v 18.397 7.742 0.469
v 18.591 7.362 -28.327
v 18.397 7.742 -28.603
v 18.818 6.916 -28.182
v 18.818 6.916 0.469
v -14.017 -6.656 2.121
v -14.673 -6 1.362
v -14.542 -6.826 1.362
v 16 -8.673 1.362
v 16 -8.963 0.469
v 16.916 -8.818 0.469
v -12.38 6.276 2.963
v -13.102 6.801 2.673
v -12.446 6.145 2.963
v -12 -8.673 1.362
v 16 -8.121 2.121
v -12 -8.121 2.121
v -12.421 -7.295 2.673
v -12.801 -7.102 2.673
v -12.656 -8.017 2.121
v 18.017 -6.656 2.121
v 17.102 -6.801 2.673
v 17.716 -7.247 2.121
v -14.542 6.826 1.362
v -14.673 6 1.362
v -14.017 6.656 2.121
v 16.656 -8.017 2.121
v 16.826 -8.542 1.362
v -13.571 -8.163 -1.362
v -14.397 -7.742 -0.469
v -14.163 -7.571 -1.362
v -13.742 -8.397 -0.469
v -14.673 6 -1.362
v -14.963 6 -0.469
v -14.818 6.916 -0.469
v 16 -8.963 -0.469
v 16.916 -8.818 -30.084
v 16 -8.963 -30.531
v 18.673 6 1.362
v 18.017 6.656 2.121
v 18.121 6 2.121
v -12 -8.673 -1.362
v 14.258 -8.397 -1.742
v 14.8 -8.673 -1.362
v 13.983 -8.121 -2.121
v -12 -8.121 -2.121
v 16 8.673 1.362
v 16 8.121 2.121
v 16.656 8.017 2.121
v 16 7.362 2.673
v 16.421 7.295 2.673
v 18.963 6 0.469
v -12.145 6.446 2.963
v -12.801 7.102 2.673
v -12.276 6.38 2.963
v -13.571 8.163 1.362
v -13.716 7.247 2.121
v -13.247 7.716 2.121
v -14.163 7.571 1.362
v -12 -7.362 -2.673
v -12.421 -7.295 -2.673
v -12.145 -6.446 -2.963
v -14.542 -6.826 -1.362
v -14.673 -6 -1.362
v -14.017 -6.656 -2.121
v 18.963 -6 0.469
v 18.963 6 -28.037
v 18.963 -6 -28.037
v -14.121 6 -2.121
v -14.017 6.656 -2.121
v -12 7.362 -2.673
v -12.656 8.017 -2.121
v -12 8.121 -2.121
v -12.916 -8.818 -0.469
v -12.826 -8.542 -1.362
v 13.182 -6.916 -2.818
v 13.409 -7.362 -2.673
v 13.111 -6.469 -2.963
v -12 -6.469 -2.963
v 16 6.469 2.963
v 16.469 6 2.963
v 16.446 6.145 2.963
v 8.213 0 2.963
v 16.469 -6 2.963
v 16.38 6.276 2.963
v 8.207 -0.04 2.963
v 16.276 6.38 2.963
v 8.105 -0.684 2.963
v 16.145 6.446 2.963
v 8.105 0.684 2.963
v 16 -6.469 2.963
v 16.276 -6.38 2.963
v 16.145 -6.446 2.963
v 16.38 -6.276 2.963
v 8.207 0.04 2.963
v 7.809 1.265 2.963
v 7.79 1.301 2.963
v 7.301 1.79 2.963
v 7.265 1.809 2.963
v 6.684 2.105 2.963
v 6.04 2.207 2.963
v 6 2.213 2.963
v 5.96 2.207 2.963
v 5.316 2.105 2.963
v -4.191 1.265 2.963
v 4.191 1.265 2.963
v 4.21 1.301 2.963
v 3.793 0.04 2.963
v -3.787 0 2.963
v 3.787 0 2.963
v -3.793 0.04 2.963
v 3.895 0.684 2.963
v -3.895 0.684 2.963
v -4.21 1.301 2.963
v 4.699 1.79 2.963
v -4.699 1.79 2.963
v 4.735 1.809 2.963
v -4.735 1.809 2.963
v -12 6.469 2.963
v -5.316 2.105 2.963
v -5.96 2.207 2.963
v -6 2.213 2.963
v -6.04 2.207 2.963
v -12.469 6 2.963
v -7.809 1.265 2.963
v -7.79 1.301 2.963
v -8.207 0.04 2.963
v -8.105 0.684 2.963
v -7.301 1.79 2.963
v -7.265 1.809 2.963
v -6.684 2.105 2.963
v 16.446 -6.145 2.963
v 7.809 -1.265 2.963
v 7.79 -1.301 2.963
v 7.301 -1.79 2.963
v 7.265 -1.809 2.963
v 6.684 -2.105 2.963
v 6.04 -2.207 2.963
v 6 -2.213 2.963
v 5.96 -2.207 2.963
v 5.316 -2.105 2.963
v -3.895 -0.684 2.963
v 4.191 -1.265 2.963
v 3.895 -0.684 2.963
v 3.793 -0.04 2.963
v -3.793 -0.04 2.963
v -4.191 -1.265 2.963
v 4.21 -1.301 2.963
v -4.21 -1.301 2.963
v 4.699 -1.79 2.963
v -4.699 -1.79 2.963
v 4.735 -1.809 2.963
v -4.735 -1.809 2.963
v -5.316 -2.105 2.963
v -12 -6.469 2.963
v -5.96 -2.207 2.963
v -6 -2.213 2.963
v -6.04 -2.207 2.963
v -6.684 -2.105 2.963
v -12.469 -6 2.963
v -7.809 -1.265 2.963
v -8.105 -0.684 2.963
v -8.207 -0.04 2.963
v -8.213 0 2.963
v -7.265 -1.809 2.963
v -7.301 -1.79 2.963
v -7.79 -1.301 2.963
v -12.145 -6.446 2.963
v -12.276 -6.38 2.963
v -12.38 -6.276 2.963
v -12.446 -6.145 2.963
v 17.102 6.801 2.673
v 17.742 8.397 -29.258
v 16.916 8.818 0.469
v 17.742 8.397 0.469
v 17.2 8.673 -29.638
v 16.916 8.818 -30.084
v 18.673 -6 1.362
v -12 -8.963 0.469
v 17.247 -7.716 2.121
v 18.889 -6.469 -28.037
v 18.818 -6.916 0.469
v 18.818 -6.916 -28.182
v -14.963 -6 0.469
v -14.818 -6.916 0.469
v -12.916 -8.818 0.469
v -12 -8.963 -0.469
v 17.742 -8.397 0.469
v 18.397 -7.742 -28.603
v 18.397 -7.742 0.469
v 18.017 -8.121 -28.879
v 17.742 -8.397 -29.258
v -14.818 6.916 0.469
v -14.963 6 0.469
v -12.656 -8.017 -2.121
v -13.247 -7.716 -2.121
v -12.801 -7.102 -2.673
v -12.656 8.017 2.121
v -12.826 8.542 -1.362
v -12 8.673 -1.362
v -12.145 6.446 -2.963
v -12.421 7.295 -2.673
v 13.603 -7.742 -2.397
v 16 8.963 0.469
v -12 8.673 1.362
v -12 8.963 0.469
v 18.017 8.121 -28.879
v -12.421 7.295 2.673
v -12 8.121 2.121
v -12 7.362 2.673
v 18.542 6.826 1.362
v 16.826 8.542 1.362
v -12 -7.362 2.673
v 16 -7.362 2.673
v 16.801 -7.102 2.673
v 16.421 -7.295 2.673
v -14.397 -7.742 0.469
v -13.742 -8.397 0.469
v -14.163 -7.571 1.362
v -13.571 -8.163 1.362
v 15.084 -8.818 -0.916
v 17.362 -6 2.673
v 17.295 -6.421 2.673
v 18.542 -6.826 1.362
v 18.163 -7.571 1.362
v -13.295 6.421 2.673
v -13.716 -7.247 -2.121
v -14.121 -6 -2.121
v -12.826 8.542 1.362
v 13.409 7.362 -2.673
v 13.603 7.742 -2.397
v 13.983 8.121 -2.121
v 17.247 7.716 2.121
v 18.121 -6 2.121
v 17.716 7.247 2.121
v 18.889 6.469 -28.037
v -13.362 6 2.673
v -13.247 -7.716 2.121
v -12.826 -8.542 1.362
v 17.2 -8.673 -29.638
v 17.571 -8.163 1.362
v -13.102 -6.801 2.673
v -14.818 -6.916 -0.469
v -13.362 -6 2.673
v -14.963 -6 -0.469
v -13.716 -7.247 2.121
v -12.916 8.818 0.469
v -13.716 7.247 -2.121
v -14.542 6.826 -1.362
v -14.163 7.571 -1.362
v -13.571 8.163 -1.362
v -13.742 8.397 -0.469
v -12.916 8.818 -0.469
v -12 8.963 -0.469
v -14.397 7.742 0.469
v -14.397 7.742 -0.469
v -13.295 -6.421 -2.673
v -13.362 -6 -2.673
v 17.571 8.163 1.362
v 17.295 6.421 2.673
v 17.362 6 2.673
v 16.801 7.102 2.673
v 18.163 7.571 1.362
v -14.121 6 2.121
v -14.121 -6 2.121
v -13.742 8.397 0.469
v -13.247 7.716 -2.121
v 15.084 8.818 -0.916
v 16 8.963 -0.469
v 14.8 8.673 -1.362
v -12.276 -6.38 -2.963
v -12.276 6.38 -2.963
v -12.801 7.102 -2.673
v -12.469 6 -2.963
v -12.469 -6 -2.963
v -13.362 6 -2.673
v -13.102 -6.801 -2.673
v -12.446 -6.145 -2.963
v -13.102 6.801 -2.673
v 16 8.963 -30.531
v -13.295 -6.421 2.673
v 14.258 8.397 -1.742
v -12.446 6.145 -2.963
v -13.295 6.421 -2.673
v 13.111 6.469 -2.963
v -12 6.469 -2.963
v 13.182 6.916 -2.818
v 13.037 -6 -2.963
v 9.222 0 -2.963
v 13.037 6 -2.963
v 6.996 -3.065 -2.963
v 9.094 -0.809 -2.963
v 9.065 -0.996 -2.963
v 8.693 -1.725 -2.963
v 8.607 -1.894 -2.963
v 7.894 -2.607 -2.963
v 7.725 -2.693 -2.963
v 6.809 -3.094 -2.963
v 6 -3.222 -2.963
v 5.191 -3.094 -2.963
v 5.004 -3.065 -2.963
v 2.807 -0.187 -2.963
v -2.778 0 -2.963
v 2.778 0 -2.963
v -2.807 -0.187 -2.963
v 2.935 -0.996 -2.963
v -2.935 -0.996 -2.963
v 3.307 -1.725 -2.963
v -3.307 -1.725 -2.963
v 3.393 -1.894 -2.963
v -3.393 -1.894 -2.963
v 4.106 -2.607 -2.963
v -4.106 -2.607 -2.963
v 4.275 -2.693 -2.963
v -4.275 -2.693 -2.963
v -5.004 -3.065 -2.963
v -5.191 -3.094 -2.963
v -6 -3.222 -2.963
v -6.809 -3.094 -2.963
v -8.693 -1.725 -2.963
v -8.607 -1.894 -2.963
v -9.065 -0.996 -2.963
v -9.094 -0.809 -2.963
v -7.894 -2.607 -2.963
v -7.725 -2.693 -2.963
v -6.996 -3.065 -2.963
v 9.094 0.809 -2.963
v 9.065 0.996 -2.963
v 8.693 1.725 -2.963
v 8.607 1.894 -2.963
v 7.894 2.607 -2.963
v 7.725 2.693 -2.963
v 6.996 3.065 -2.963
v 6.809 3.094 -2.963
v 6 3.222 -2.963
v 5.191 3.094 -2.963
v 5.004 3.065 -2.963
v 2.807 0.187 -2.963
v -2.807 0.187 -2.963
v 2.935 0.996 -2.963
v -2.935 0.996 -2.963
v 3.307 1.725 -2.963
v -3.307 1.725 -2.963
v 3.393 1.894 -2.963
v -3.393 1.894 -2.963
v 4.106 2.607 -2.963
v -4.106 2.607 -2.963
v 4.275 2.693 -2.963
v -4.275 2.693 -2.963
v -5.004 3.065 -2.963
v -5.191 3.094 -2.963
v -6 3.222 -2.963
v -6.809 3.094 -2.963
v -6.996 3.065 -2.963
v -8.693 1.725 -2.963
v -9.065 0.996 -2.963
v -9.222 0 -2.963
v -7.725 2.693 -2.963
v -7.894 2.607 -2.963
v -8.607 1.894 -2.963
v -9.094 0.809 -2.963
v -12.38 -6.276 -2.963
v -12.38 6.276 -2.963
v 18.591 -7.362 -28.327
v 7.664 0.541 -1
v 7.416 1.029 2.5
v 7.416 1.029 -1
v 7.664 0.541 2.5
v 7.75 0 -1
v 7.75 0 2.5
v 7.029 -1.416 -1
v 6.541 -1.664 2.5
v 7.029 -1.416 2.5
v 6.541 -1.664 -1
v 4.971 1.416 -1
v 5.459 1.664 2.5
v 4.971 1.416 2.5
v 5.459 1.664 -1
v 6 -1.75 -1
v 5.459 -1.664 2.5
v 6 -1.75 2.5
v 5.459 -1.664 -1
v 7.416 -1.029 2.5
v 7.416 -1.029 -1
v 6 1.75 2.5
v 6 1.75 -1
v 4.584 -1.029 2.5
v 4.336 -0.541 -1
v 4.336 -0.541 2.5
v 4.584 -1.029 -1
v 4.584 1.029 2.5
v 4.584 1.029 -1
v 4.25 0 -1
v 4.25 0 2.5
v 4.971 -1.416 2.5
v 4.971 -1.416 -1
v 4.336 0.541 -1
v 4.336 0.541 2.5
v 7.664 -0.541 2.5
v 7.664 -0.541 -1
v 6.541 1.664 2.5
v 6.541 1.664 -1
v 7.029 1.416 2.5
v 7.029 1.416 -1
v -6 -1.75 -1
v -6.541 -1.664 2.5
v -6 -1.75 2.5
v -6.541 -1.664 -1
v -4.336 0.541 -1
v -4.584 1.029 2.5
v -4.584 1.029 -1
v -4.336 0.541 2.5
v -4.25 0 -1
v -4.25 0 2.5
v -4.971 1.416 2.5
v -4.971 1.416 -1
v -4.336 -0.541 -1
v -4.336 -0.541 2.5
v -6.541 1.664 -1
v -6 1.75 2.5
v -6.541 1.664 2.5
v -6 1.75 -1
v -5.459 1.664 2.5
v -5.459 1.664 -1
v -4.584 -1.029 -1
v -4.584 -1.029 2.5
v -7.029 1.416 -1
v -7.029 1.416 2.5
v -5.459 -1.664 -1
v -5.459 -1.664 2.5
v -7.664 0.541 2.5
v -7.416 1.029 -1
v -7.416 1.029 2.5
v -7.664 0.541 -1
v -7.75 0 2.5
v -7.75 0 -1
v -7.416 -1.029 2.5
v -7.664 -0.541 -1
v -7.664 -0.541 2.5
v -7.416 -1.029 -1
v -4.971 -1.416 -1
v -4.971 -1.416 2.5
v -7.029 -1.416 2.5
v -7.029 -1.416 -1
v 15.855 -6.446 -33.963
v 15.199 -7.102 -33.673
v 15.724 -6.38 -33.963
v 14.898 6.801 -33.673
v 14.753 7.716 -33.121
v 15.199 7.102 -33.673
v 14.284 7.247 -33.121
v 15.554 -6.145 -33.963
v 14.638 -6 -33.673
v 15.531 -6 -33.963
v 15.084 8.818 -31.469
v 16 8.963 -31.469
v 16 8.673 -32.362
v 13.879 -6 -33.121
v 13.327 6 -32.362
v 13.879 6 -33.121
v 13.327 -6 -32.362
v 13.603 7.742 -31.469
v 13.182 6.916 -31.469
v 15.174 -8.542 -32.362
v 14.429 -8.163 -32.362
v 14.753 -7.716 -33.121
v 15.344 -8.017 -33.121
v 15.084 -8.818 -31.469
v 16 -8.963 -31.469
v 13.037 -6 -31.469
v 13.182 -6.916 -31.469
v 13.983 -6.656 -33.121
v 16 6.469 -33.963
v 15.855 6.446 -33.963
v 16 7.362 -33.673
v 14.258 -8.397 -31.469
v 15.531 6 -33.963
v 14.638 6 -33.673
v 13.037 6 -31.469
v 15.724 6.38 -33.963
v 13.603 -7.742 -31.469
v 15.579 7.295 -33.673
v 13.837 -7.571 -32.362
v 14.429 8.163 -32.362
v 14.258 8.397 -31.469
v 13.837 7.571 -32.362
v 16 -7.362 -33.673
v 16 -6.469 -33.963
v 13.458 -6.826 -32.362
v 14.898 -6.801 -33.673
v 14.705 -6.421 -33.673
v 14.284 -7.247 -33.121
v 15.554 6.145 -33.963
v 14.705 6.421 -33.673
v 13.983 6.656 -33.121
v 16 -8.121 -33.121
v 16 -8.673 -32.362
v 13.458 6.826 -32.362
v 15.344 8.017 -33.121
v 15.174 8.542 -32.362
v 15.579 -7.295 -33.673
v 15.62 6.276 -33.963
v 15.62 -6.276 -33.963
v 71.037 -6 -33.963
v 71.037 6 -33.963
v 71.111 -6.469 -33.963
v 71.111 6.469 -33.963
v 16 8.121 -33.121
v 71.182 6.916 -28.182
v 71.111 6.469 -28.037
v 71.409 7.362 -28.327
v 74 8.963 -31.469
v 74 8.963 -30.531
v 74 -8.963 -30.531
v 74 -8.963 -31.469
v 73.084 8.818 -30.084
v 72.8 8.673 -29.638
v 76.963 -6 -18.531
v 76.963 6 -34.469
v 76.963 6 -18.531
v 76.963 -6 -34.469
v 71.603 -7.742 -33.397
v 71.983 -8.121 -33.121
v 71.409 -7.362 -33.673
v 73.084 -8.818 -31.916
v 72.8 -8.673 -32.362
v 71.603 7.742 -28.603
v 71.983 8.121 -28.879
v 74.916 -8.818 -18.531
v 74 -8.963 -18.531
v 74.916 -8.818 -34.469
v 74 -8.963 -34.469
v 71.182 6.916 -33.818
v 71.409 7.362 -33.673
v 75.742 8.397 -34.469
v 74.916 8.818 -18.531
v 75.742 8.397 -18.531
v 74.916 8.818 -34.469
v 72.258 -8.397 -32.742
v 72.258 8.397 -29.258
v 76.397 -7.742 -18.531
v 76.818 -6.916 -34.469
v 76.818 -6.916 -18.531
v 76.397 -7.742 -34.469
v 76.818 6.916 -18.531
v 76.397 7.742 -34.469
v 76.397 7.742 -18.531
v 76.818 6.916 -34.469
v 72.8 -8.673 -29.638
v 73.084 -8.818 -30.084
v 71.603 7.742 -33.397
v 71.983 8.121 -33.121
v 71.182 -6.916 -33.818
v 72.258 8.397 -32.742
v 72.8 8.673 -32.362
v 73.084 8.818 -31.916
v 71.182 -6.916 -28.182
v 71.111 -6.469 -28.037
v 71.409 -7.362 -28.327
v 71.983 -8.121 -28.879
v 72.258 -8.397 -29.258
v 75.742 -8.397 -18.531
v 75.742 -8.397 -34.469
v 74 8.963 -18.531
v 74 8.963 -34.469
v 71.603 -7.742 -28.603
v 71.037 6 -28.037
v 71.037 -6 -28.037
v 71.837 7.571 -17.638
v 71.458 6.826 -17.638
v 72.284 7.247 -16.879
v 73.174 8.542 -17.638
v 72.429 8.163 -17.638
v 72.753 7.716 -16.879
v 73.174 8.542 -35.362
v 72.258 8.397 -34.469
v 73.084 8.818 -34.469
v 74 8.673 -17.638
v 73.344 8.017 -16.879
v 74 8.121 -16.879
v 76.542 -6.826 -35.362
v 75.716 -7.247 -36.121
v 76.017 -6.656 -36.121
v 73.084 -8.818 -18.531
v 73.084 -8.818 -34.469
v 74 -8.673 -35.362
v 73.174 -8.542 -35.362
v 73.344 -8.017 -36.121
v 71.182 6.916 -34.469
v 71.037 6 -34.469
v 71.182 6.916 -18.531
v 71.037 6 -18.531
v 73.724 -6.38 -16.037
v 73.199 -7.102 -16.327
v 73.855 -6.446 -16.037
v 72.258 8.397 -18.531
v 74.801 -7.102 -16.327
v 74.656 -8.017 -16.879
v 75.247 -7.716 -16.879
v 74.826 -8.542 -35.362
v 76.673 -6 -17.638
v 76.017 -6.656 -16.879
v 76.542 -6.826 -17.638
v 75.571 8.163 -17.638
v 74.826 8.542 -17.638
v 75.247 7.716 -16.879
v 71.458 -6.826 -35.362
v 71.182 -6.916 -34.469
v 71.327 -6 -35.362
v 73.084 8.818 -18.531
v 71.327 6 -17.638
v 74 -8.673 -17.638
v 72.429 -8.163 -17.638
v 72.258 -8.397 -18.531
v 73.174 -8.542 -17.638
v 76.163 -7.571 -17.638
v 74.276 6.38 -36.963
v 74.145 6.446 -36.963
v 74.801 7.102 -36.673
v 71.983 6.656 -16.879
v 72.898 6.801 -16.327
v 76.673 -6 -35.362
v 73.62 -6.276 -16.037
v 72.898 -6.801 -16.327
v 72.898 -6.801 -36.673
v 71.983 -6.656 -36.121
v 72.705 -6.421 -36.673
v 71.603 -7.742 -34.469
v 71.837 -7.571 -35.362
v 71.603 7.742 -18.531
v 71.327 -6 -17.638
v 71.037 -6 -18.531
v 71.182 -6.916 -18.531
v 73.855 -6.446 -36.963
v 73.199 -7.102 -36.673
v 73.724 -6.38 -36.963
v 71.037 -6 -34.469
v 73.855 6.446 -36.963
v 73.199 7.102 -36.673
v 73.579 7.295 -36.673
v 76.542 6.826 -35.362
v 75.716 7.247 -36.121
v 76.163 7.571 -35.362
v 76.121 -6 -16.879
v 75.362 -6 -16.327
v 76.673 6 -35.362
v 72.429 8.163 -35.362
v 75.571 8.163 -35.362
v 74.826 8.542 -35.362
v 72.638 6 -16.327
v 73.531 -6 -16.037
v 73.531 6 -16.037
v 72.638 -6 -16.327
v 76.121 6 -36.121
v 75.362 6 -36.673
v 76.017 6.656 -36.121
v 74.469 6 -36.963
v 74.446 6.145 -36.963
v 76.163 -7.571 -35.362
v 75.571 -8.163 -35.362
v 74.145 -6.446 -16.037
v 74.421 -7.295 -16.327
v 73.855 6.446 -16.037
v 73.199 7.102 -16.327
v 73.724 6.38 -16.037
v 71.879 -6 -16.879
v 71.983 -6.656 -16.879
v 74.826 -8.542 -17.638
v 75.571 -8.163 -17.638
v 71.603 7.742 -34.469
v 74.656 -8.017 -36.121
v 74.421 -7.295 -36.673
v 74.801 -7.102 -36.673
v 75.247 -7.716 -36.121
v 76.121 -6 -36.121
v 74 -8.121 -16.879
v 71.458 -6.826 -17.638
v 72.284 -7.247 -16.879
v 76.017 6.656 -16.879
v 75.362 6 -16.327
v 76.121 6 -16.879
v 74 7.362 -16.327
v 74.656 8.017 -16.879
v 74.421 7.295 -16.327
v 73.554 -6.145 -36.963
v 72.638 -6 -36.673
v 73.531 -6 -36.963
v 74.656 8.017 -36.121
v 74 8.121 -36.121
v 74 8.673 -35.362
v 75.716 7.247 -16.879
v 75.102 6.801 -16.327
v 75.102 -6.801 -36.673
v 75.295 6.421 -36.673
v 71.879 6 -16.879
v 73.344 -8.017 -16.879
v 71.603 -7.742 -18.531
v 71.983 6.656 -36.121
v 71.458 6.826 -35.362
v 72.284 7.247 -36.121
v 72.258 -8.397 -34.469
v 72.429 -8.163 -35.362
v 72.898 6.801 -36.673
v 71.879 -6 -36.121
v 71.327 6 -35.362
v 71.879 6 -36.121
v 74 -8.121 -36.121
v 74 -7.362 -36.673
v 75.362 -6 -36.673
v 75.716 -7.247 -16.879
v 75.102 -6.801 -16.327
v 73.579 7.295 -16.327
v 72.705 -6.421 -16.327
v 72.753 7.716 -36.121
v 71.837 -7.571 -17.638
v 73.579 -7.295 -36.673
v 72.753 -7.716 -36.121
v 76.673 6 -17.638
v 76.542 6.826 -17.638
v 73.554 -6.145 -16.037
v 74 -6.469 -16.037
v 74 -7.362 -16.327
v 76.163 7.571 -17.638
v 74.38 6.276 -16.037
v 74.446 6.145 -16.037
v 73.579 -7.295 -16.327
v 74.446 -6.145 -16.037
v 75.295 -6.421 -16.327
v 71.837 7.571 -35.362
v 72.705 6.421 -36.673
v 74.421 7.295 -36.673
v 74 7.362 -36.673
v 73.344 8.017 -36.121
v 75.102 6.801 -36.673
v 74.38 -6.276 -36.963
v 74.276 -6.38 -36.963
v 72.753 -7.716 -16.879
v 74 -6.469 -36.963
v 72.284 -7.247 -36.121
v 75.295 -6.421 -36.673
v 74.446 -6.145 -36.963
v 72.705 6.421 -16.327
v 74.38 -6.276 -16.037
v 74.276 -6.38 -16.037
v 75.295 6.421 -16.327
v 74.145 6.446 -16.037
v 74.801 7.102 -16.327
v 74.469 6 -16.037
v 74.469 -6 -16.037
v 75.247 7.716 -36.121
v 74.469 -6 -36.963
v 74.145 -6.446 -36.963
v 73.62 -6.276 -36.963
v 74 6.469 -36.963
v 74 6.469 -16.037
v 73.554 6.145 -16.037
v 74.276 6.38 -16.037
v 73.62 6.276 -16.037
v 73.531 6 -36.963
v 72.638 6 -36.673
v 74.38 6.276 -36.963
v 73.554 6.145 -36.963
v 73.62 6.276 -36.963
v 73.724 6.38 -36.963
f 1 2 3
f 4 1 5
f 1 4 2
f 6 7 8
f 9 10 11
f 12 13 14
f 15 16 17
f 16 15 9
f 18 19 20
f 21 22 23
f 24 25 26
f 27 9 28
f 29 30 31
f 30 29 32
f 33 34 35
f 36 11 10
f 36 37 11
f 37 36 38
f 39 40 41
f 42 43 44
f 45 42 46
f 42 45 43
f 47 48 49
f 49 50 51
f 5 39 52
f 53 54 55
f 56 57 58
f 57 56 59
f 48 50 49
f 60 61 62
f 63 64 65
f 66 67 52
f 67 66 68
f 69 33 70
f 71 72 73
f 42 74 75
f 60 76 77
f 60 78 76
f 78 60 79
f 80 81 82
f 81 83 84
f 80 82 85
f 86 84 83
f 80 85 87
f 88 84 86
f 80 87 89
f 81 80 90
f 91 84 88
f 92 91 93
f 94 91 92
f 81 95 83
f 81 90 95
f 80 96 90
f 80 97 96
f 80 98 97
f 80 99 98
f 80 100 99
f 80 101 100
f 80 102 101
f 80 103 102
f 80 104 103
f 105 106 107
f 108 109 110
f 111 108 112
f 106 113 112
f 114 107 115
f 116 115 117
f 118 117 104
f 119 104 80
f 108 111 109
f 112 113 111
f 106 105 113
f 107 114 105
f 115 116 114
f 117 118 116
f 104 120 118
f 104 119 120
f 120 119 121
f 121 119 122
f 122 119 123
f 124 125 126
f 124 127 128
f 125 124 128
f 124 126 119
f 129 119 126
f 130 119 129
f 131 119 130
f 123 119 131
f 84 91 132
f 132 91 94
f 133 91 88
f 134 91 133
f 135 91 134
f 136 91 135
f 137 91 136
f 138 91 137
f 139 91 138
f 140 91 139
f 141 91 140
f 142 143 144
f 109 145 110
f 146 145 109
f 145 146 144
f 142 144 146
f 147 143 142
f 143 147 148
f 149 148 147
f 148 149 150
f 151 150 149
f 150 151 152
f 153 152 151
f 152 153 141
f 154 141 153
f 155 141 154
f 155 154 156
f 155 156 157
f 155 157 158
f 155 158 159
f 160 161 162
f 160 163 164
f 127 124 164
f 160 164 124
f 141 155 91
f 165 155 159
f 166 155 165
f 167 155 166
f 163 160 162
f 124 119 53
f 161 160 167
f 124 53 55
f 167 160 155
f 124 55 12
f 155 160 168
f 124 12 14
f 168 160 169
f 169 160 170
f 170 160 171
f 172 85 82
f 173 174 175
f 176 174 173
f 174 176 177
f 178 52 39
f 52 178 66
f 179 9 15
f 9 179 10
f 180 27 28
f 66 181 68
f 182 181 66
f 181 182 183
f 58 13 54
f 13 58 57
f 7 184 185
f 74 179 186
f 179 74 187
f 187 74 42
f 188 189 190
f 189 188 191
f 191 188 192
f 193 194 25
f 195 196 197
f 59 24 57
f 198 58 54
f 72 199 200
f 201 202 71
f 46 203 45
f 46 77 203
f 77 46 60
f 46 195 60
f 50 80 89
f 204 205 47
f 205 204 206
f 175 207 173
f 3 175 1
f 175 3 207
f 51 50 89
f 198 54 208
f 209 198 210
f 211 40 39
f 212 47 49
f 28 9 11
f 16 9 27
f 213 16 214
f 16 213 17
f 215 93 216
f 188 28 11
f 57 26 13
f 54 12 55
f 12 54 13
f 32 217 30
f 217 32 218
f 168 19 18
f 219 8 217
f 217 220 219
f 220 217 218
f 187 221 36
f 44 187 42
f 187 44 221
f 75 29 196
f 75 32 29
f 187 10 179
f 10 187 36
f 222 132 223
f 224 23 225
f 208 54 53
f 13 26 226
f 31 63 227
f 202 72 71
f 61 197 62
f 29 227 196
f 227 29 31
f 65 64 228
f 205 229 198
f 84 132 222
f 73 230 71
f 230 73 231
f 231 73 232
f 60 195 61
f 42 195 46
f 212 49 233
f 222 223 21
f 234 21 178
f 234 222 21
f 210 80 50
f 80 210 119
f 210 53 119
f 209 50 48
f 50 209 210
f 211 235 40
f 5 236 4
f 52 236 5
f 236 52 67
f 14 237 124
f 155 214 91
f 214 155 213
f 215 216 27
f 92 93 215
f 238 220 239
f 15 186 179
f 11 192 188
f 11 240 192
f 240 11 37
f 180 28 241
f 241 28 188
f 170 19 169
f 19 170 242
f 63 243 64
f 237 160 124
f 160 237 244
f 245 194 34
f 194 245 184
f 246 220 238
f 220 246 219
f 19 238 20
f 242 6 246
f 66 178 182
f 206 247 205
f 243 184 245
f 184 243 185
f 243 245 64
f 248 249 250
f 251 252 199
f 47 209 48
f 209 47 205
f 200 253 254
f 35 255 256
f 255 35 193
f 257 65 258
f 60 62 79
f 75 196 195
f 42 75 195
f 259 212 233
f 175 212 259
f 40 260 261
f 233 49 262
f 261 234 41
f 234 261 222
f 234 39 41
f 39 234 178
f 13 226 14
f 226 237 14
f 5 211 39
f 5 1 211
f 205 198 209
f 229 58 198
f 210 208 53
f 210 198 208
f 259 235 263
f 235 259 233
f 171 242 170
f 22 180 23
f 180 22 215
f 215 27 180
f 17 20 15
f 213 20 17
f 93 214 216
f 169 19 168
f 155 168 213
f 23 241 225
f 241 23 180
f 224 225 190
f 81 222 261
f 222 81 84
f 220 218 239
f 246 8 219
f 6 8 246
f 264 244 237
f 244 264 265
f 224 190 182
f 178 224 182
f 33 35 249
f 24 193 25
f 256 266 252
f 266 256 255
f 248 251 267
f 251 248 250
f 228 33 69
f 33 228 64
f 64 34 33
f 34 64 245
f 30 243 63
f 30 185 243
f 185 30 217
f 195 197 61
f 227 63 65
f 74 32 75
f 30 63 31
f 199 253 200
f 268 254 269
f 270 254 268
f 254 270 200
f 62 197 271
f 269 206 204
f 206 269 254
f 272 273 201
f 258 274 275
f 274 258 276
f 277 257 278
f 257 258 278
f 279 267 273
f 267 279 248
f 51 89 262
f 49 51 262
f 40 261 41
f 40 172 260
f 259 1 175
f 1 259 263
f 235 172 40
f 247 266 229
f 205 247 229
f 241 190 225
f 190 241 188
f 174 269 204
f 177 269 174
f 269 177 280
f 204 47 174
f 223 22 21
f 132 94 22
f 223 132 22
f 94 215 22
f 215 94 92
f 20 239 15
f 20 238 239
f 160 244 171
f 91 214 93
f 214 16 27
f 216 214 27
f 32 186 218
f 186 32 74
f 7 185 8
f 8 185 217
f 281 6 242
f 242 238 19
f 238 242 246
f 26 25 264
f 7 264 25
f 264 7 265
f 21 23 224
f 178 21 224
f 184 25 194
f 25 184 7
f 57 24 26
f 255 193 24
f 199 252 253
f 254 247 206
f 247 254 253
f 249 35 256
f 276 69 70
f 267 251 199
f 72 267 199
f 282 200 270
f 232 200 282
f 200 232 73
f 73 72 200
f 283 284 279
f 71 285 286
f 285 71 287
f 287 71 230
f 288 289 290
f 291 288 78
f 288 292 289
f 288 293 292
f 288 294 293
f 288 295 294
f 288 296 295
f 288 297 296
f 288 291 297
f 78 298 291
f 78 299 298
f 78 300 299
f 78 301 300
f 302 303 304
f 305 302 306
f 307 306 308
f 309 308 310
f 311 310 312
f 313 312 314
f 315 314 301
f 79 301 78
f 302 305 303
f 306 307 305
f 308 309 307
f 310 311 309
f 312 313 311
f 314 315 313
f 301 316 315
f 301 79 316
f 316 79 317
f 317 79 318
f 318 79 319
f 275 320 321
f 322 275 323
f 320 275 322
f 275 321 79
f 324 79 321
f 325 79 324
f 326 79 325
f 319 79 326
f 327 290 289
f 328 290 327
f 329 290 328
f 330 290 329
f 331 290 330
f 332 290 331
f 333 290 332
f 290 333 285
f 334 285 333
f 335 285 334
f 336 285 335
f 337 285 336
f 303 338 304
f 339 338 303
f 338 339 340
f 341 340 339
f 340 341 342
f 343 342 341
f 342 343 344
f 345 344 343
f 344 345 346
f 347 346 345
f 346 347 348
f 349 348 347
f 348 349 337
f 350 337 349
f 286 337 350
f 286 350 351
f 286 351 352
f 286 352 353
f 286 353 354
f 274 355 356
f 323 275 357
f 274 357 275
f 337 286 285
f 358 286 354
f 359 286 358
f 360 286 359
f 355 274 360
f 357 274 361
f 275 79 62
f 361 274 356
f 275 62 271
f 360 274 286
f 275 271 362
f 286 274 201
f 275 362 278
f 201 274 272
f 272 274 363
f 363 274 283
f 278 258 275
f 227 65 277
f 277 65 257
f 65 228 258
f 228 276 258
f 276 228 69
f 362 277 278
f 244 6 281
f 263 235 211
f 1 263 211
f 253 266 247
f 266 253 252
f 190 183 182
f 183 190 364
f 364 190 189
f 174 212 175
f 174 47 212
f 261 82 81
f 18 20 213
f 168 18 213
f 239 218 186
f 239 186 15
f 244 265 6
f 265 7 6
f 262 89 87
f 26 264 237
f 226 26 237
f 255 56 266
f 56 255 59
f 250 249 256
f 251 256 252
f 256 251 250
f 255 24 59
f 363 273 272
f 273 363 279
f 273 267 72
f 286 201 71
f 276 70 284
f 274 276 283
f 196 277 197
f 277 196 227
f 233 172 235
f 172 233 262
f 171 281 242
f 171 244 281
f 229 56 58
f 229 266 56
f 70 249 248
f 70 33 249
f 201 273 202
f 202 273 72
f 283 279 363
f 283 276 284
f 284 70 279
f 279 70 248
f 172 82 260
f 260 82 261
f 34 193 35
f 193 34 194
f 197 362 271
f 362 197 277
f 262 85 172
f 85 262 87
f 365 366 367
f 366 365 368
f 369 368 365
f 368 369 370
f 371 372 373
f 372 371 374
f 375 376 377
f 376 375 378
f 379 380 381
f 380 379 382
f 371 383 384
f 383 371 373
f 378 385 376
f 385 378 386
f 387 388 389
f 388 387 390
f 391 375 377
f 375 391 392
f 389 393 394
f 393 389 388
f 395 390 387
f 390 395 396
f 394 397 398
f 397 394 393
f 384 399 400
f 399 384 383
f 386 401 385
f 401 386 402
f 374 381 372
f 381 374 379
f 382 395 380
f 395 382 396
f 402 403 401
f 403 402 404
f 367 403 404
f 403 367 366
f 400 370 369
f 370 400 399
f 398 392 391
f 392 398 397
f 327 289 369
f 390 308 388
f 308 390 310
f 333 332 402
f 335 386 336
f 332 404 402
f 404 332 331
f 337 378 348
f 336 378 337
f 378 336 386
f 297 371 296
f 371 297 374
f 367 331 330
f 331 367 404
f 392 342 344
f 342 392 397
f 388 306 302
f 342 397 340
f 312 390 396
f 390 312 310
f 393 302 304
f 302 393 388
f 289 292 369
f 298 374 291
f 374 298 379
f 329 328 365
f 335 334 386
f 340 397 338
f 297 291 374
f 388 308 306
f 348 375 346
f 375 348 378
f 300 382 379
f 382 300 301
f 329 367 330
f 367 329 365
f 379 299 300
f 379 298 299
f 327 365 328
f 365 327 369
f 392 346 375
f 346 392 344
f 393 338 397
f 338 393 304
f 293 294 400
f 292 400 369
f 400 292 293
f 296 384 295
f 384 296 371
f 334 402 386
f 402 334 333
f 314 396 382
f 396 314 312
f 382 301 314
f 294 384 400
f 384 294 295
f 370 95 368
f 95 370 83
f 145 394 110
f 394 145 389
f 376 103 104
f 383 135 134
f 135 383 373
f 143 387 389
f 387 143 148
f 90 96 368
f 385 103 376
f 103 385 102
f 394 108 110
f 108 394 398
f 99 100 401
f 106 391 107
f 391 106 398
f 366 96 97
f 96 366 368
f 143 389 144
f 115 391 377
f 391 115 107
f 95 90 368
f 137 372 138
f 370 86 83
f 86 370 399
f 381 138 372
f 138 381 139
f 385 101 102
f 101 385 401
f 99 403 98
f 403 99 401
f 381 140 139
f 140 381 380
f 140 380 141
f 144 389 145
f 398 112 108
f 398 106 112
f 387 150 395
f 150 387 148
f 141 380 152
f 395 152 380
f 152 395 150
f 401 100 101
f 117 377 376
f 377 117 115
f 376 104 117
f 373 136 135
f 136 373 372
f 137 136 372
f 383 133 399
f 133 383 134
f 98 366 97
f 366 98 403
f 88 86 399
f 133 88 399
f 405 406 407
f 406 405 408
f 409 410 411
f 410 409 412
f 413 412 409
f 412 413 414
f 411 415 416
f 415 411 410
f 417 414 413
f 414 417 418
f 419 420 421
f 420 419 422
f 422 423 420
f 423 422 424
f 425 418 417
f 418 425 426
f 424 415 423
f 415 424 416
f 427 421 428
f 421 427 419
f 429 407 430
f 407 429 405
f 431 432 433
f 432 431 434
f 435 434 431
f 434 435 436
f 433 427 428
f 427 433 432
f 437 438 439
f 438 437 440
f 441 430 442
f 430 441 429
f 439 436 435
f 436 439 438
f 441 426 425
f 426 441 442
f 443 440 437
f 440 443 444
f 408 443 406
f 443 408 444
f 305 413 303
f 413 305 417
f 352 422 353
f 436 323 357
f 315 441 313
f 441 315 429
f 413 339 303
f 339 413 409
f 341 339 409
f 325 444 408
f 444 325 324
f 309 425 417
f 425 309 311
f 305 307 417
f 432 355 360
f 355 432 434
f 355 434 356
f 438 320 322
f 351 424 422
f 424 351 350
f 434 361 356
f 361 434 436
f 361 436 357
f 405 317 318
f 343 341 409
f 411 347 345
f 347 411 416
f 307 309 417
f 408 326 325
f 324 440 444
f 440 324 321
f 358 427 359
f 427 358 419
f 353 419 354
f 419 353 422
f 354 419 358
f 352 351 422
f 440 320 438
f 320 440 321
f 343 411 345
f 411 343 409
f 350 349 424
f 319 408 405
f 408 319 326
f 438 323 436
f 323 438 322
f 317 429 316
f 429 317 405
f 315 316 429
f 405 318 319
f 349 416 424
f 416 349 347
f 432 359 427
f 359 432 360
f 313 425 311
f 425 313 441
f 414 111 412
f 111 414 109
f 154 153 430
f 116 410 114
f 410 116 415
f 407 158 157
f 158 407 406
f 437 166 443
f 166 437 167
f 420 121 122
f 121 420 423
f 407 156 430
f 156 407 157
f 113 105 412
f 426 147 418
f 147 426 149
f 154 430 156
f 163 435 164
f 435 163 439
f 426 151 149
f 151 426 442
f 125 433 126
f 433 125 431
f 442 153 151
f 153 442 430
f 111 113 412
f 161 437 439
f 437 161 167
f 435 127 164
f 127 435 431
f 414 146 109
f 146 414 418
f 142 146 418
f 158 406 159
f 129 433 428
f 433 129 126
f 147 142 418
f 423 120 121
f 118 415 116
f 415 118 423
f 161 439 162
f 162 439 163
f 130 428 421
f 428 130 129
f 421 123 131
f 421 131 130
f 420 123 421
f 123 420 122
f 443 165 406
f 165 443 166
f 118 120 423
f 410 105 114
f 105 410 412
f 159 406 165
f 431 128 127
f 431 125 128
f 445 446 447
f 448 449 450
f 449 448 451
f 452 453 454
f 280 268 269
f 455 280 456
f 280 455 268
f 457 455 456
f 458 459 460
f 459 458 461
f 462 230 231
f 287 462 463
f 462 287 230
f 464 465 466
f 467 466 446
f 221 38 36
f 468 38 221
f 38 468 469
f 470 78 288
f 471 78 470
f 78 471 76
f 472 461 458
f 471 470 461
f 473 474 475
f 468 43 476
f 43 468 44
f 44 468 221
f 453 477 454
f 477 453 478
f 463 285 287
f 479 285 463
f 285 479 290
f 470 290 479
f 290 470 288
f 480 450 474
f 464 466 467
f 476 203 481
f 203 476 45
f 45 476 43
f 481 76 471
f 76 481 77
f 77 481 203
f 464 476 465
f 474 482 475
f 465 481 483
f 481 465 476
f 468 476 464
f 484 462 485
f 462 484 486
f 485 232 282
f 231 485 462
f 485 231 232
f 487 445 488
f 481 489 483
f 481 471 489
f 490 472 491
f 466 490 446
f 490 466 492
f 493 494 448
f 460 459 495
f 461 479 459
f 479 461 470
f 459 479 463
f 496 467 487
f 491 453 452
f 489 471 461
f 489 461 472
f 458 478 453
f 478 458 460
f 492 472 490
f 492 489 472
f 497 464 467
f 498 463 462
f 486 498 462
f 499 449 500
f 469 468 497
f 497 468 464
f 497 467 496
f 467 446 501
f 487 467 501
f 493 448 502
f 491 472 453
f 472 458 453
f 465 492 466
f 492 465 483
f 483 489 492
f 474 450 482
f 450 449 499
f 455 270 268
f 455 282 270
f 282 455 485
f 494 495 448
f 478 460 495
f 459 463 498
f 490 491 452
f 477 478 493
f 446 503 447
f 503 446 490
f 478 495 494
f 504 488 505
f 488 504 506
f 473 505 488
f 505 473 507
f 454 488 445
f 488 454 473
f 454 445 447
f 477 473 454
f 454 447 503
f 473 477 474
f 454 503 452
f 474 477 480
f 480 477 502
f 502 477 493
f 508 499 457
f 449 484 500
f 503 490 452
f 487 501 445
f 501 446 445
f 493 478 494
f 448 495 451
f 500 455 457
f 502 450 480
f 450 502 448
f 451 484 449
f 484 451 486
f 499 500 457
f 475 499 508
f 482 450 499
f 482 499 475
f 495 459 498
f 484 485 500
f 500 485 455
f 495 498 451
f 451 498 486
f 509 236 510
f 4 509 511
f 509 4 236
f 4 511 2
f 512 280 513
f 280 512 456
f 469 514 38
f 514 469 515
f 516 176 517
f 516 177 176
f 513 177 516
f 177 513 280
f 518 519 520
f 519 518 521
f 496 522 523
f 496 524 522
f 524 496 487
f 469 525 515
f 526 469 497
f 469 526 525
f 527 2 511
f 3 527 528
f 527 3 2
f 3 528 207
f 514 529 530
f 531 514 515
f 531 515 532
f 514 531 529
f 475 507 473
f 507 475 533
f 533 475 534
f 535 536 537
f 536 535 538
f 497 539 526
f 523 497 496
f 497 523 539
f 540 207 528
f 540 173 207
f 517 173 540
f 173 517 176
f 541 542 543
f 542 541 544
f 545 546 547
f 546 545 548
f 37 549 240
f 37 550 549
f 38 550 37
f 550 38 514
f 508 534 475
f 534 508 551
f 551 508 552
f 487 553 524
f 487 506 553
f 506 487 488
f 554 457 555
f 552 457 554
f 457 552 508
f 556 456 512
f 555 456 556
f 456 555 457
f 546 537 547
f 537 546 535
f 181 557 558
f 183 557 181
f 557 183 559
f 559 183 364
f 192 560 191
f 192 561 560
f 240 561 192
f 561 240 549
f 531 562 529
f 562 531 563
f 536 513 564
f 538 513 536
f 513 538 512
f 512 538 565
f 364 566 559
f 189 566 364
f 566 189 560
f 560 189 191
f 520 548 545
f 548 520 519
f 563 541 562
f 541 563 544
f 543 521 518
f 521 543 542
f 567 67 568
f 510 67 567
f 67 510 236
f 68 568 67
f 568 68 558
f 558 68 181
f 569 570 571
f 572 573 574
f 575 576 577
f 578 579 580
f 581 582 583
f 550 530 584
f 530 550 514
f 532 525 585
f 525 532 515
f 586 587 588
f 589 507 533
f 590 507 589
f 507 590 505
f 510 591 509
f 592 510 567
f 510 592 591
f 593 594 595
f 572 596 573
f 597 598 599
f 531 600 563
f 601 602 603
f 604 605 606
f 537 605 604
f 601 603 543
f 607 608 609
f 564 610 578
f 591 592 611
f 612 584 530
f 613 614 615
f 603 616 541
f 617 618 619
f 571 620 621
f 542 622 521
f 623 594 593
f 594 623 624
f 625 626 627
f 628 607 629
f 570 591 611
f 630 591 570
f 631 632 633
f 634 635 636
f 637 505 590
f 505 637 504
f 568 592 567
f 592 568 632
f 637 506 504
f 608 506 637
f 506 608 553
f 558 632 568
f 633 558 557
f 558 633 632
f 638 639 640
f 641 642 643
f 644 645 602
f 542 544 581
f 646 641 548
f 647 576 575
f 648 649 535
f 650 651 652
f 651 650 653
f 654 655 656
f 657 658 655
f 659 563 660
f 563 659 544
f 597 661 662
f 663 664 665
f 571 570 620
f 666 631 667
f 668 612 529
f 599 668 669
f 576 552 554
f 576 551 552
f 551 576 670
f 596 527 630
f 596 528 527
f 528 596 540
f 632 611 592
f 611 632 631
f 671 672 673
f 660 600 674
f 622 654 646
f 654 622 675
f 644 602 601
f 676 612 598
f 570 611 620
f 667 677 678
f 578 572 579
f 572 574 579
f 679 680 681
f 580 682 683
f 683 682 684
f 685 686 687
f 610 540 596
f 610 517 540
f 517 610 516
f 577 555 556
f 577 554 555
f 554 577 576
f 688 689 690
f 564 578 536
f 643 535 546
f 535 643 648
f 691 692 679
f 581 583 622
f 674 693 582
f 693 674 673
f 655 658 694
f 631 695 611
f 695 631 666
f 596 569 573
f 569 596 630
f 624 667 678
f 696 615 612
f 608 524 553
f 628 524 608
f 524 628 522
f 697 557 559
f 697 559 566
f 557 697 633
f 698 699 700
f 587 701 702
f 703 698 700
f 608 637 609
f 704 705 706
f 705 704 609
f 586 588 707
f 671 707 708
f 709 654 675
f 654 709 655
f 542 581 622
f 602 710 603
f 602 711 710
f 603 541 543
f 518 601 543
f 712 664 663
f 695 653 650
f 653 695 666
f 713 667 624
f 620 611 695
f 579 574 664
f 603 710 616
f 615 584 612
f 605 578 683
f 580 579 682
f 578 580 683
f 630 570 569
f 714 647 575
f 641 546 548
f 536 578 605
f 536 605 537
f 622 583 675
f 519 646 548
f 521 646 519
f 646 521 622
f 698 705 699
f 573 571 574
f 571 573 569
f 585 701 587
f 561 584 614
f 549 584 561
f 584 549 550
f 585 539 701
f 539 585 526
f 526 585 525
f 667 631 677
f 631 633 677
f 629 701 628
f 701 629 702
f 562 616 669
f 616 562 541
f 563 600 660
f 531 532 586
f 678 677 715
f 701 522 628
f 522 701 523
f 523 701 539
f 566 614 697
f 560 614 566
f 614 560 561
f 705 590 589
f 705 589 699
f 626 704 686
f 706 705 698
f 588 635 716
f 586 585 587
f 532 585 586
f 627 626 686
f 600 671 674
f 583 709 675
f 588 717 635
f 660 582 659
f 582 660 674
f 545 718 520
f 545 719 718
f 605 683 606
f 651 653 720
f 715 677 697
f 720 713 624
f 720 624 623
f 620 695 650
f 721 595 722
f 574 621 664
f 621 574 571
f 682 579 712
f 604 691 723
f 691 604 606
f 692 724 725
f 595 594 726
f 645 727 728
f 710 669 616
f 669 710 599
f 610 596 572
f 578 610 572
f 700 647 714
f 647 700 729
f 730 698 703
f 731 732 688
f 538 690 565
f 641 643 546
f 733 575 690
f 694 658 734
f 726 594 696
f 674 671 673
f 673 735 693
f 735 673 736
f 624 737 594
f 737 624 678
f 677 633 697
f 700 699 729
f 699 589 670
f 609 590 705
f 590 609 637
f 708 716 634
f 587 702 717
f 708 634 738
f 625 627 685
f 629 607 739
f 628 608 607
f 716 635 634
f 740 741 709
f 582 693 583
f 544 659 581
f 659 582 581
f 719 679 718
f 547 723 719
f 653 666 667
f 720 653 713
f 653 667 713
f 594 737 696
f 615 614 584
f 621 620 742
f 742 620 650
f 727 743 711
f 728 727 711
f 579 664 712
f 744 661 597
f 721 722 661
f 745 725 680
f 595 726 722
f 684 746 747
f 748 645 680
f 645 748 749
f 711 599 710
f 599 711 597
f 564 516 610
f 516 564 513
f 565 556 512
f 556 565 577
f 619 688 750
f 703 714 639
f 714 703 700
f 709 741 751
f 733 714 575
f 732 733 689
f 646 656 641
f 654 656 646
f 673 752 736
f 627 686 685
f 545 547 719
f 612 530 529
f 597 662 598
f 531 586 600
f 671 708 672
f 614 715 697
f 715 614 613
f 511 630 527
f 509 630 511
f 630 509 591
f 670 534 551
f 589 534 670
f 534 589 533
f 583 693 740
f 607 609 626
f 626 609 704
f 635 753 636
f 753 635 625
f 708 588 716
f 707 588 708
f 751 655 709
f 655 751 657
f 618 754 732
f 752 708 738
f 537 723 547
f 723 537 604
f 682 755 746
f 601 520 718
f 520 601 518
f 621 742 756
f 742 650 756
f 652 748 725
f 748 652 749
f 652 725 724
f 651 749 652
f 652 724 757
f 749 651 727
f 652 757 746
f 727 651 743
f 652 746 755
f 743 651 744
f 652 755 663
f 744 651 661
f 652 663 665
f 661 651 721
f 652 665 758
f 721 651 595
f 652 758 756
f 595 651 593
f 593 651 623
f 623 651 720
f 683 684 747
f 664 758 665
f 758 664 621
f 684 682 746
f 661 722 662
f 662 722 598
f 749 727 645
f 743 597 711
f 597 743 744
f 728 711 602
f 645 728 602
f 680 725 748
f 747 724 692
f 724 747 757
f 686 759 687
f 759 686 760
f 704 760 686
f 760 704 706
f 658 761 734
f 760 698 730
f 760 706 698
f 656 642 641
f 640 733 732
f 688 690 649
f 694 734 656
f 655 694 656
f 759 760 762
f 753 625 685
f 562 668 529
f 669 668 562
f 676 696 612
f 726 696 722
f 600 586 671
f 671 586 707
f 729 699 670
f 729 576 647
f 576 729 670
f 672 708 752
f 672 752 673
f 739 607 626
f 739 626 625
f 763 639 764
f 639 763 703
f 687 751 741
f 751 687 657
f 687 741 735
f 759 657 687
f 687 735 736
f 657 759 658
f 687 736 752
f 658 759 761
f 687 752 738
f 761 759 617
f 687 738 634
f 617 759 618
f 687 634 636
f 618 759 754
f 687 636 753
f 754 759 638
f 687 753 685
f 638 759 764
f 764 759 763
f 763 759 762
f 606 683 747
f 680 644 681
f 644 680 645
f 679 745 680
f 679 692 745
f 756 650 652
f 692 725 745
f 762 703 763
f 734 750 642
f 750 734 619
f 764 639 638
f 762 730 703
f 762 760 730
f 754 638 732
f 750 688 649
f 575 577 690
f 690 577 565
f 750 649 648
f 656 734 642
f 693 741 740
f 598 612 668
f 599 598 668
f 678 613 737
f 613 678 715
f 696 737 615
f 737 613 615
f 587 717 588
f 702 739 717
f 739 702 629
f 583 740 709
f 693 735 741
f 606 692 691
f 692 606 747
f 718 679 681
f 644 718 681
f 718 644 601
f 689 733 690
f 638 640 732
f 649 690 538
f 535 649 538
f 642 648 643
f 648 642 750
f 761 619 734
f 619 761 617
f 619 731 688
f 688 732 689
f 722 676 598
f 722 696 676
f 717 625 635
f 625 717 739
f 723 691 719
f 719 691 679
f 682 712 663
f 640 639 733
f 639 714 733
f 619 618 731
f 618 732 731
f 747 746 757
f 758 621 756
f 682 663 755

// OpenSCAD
/**
 * Martin Egli
 * 2020-09-06
 * Holder for hp zbook supply
 */
res = 20;

module side(w1 = 12) {
    difference() {
        hull() {
            translate([-12,-w1/2, 0])
            sphere(r = 3, $fn = res);
            translate([-12,+w1/2, 0])
            sphere(r = 3, $fn = res);

            translate([16,-w1/2, 0])
            sphere(r = 3, $fn = res);
            translate([16,+w1/2, 0])
            sphere(r = 3, $fn = res);
        }

        translate([+6,0,-4])
        cylinder(r = 3.5/2, h = 8, $fn = res);
        translate([+6,0,-4])
        cylinder(r1 = 8/2, r2 = 3.5/2, h = 3, $fn = res);
        translate([+6,0,2.5])
        cylinder(r1 = 3.5/2, r2 = 4.5/2, h = 0.5, $fn = res);

        translate([-6,0,-4])
        cylinder(r = 3.5/2, h = 8, $fn = res);
        translate([-6,0,-4])
        cylinder(r1 = 8/2, r2 = 3.5/2, h = 3, $fn = res);
        translate([-6,0,2.5])
        cylinder(r1 = 3.5/2, r2 = 4.5/2, h = 0.5, $fn = res);
    }

    hull() {
        translate([16,-w1/2, 0])
        sphere(r = 3, $fn = res);
        translate([16,+w1/2, 0])
        sphere(r = 3, $fn = res);

        translate([16,-w1/2, -31])
        sphere(r = 3, $fn = res);
        translate([16,+w1/2, -31])
        sphere(r = 3, $fn = res);
    }

    hull() {
        translate([16,-w1/2, -31])
        sphere(r = 3, $fn = res);
        translate([16,+w1/2, -31])
        sphere(r = 3, $fn = res);

        translate([16+52+6,-w1/2, -31])
        sphere(r = 3, $fn = res);
        translate([16+52+6,+w1/2, -31])
        sphere(r = 3, $fn = res);
    }

    hull() {
        translate([16+52+6,-w1/2, -31+12])
        sphere(r = 3, $fn = res);
        translate([16+52+6,+w1/2, -31+12])
        sphere(r = 3, $fn = res);

        translate([16+52+6,-w1/2, -31-3])
        sphere(r = 3, $fn = res);
        translate([16+52+6,+w1/2, -31-3])
        sphere(r = 3, $fn = res);
    }
}
side();
